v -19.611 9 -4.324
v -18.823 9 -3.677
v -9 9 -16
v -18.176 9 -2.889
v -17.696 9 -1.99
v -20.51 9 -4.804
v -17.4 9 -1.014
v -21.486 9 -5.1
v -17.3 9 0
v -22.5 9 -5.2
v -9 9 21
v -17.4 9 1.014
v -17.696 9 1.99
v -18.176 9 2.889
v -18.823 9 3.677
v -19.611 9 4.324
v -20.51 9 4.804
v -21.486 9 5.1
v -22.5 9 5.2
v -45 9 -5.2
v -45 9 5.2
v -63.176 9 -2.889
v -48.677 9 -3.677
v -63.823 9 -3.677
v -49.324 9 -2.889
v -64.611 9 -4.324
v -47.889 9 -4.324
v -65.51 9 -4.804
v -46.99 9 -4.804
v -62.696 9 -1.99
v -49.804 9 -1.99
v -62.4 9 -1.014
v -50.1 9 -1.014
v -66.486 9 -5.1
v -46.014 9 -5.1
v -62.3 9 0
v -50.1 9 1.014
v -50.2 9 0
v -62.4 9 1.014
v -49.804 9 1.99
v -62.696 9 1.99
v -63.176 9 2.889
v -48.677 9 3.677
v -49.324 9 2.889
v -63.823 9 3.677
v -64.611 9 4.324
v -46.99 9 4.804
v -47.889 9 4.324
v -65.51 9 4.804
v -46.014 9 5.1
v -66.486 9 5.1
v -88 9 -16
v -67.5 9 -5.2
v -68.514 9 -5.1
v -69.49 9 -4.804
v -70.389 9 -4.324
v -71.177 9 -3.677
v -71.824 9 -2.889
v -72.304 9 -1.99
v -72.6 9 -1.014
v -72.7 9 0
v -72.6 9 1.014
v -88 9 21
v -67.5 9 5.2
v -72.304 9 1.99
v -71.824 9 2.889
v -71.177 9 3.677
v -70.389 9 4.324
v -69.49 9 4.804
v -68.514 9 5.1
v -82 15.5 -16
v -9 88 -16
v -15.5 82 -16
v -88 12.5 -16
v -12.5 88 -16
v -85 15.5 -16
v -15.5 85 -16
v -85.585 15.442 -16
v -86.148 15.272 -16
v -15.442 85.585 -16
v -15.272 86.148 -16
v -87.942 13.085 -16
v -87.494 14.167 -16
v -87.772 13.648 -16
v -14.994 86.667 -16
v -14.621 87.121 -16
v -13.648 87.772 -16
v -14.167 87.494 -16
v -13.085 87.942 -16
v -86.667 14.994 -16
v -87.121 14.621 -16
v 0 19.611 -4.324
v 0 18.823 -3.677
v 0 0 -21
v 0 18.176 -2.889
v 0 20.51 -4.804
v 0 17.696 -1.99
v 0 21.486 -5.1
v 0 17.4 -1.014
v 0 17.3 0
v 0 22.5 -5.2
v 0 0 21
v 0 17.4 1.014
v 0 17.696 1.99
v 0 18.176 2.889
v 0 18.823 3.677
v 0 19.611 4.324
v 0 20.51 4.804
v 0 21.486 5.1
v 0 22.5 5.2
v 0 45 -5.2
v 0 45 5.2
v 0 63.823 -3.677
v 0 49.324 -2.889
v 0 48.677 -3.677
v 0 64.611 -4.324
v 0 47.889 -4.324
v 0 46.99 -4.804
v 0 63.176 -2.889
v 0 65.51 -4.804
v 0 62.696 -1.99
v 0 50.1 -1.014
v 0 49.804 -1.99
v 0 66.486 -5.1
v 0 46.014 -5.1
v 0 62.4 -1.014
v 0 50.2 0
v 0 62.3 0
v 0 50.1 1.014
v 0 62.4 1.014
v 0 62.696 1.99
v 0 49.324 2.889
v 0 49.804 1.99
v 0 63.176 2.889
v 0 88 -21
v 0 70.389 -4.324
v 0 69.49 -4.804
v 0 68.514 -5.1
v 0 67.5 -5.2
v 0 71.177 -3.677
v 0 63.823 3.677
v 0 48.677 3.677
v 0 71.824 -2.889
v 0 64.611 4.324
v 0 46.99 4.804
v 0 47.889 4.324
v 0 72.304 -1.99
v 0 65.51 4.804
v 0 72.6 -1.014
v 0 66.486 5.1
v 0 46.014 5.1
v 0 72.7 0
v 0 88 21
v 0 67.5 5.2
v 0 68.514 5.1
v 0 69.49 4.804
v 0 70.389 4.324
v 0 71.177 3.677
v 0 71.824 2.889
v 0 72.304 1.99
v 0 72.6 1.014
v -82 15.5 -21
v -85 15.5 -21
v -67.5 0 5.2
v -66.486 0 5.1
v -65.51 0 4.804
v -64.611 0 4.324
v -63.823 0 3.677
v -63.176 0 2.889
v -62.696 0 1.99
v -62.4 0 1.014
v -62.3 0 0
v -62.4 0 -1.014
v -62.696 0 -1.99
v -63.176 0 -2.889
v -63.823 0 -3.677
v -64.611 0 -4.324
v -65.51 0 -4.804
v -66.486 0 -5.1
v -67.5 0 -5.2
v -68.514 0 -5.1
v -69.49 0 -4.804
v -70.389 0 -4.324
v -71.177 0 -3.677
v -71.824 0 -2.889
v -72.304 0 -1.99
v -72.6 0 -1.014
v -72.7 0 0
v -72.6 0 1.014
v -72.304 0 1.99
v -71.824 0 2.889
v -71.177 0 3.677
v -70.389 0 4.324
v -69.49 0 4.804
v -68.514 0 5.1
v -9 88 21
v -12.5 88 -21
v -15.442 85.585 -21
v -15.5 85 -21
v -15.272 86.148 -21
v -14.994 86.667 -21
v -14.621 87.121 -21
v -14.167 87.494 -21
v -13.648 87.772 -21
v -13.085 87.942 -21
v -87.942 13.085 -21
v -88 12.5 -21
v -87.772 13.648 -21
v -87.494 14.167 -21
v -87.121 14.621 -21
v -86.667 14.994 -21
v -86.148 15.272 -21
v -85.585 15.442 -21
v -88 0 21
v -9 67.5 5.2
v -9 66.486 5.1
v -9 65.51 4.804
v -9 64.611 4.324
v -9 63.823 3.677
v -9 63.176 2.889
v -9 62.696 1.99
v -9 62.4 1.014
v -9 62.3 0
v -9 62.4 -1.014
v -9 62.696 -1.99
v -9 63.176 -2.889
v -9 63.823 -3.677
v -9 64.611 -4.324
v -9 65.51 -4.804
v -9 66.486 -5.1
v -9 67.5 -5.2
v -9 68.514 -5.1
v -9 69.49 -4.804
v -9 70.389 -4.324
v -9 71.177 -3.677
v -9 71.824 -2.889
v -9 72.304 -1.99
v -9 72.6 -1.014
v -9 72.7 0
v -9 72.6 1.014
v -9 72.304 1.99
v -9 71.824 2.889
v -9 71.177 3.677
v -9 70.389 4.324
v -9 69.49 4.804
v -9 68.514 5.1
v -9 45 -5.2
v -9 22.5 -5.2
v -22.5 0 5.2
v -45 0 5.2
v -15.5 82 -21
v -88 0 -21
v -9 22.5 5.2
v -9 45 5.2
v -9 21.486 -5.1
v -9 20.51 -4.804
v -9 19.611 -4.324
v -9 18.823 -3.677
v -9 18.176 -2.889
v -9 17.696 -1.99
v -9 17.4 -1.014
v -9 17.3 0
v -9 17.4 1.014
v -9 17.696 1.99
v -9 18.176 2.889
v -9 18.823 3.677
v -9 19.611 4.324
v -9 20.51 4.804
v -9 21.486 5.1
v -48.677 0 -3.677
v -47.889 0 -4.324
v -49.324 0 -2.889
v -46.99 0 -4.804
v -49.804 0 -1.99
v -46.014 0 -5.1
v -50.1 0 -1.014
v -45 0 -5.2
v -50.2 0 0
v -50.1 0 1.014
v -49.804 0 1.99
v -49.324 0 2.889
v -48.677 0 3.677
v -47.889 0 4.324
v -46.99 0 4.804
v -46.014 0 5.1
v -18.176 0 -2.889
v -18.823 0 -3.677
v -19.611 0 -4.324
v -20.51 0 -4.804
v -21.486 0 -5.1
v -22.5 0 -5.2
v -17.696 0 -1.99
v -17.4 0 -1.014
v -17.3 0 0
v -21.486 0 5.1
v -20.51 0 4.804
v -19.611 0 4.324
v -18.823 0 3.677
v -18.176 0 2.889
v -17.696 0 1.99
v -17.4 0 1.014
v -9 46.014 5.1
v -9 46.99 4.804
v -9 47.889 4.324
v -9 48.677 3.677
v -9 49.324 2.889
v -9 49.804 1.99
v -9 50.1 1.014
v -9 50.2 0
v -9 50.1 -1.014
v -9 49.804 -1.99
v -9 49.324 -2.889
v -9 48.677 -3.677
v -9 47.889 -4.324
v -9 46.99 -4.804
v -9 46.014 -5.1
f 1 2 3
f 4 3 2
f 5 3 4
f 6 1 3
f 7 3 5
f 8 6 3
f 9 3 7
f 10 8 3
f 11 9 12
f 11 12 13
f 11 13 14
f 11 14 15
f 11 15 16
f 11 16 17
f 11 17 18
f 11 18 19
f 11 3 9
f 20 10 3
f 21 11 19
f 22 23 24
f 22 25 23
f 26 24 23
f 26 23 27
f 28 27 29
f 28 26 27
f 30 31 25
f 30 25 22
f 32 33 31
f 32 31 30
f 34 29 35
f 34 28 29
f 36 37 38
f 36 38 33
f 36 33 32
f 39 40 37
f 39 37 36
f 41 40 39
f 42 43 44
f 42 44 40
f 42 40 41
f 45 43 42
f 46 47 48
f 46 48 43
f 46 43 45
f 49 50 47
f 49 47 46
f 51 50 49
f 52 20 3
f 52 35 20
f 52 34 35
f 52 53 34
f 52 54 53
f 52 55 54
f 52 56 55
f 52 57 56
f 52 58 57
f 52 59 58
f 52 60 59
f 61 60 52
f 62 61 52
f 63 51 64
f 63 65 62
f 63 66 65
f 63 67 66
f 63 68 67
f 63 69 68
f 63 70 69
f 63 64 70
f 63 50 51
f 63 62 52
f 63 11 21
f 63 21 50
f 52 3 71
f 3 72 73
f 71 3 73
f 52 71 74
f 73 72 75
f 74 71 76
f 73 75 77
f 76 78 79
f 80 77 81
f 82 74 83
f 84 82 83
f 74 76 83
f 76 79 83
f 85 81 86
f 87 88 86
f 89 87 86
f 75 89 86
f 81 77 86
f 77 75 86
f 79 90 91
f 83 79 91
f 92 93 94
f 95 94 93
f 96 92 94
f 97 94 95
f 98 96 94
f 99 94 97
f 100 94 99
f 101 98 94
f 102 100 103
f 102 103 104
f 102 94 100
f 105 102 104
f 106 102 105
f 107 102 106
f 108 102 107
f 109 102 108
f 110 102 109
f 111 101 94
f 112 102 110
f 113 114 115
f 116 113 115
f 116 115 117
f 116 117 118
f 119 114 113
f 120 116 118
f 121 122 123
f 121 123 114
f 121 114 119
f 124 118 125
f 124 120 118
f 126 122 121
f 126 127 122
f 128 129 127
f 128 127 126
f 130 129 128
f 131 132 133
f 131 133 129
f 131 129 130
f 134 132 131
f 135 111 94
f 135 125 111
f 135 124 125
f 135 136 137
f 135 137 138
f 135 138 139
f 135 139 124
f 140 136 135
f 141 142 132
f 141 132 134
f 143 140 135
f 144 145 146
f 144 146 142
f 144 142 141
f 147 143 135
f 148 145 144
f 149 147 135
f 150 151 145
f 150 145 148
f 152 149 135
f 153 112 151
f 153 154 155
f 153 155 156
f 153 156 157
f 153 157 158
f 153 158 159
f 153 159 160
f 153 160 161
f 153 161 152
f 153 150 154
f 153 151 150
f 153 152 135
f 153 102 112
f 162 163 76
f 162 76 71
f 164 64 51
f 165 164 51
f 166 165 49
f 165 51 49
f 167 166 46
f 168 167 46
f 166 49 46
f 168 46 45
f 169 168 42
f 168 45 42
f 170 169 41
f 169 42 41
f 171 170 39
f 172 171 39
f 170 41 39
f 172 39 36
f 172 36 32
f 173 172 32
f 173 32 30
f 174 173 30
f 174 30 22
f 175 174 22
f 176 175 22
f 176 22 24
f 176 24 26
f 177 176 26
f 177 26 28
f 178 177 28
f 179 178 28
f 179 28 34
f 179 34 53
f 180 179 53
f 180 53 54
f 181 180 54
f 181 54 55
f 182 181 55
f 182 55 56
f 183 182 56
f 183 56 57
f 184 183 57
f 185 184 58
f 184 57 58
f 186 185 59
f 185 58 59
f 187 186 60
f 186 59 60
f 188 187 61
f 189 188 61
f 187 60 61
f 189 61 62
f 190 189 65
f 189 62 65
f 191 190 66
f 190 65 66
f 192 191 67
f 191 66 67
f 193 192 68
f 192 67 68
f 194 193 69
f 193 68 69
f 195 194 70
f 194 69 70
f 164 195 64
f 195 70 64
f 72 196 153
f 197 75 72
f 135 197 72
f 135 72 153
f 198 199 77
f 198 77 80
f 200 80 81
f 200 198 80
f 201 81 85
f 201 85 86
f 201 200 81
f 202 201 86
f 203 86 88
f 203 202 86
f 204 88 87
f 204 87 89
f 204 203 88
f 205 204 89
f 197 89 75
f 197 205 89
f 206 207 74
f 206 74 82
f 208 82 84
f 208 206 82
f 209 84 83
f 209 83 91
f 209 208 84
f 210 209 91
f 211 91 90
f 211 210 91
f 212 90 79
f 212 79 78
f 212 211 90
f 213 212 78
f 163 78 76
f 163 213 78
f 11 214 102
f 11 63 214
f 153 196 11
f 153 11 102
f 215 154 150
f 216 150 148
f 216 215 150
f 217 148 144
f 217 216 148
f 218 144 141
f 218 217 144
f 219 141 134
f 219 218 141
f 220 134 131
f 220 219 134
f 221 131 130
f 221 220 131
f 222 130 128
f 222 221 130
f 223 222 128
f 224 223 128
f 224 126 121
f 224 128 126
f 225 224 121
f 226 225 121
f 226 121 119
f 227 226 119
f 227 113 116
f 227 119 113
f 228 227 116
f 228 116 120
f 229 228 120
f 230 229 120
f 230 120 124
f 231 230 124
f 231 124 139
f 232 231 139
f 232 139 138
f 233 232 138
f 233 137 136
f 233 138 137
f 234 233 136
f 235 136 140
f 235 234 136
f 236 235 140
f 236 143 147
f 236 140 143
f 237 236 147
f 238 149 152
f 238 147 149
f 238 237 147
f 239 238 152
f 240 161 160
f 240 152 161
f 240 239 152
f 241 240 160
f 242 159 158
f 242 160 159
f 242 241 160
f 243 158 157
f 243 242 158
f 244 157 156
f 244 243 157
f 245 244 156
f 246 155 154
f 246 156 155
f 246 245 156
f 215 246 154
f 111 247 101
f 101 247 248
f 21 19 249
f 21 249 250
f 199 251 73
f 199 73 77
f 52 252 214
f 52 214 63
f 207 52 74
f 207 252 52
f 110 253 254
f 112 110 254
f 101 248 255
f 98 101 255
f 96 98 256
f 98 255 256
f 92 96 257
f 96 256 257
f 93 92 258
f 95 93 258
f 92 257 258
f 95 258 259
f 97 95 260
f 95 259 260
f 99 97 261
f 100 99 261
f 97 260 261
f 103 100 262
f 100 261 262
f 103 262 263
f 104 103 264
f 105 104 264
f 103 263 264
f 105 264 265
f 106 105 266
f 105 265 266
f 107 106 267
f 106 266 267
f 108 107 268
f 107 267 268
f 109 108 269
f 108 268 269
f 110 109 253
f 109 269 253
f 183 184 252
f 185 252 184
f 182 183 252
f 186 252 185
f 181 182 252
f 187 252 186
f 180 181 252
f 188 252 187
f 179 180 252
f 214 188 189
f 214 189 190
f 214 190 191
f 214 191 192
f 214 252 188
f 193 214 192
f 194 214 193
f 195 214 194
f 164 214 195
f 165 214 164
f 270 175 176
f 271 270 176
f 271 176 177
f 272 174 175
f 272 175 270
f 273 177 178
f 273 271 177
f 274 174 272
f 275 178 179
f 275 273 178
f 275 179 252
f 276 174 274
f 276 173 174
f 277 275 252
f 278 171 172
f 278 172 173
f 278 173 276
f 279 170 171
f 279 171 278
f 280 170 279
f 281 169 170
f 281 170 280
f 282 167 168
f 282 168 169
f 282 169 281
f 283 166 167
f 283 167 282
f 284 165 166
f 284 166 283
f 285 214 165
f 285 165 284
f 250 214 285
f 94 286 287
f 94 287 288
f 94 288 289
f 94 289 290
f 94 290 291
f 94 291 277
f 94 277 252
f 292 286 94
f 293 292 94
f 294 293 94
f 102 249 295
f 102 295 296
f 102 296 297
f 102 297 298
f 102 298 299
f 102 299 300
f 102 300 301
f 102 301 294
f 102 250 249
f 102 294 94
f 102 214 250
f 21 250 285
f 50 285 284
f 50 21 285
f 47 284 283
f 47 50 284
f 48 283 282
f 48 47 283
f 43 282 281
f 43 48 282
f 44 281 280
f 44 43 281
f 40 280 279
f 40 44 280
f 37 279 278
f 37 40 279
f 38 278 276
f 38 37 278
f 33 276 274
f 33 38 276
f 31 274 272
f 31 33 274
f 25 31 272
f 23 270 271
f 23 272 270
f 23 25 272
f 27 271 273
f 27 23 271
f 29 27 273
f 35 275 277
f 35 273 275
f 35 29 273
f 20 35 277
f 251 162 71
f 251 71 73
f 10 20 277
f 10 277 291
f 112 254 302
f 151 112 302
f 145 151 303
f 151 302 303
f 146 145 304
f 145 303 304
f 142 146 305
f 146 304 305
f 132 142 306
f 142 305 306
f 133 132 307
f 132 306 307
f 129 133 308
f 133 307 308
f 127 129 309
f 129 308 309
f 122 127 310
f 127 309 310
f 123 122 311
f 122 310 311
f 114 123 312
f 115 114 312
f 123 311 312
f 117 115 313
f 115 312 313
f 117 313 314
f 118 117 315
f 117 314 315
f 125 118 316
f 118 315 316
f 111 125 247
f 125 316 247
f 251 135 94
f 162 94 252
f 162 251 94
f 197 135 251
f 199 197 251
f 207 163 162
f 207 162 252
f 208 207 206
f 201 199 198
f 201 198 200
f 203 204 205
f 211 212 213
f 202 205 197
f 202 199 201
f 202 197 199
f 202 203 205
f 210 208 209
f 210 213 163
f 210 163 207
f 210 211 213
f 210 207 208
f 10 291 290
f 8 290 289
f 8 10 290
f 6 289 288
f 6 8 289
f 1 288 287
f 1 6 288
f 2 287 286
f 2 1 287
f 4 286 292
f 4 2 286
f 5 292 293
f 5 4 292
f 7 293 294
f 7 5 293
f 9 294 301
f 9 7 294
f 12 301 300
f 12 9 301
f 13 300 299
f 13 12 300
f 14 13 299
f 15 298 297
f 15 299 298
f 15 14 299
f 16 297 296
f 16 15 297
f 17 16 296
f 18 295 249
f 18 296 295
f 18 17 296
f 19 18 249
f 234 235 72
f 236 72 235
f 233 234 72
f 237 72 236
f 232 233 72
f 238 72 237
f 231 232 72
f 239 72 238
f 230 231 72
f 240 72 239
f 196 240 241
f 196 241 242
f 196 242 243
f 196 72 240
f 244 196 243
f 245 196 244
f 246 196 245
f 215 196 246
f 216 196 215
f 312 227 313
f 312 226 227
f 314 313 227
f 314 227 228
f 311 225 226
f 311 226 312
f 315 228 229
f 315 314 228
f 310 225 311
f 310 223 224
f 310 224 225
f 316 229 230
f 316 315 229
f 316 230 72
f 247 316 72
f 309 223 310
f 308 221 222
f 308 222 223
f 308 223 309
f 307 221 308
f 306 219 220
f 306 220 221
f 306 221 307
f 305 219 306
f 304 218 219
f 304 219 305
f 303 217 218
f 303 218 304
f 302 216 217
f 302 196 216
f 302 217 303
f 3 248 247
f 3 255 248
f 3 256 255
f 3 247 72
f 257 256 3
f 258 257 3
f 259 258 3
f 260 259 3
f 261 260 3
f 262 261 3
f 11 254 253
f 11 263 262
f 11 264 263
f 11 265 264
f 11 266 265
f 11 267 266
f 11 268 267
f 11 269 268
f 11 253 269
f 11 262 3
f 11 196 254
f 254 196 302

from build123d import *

# Parameters (mm, degrees)
EXTRUDE_1_DEPTH     = 21
EXTRUDE_2_DEPTH     = 5
SKETCH_5_R          = 5.2
CUT_EXTRUDE_1_DEPTH = 121.108284477


with BuildPart() as part:
    # 草图1 → 凸台-拉伸1 (new, symmetric)
    with BuildSketch(Plane.XY):
        Polygon((-88, 0), (0, 0), (0, 88), (-9, 88), (-9, 9), (-88, 9), align=None)
    extrude(amount=EXTRUDE_1_DEPTH, both=True)

    # 草图4 → 凸台-拉伸2 (add)
    with BuildSketch(Plane(origin=(0, 0, -21), x_dir=(-1, 0, 0), z_dir=(0, 0, -1))):
        with BuildLine():
            Line((88, 9), (88, 12.5))
            ThreePointArc((88, 12.5), (87.121320344, 14.621320344), (85, 15.5))
            Line((85, 15.5), (82, 15.5))
            Line((82, 15.5), (15.5, 82))
            Line((15.5, 82), (15.5, 85))
            ThreePointArc((15.5, 85), (14.621320344, 87.121320344), (12.5, 88))
            Line((12.5, 88), (9, 88))
            Line((9, 88), (9, 9))
            Line((9, 9), (88, 9))
        make_face()
    extrude(amount=-EXTRUDE_2_DEPTH)

    # 草图5 → 切除-拉伸1 (cut, through all)
    with BuildSketch(Plane(origin=(0, 9, 0), x_dir=(1, 0, 0), z_dir=(0, 1, 0))):
        with Locations(Location((-67.5, 0, 0), (0, 0, 270))):
            Circle(SKETCH_5_R)
        with BuildLine():
            Line((-45, 5.2), (-22.5, 5.2))
            ThreePointArc((-22.5, 5.2), (-17.3, 0), (-22.5, -5.2))
            Line((-22.5, -5.2), (-45, -5.2))
            ThreePointArc((-45, -5.2), (-50.2, 0), (-45, 5.2))
        make_face()
    cut_extrude_1 = extrude(amount=-CUT_EXTRUDE_1_DEPTH, mode=Mode.SUBTRACT)

    # 镜向1: 切除-拉伸1 across plane
    add(cut_extrude_1.mirror(Plane(origin=(0, 0, 0), x_dir=(0, 0, 1), z_dir=(-0.7071067811865477, -0.7071067811865475, 0))), mode=Mode.SUBTRACT)


solid = part.part
